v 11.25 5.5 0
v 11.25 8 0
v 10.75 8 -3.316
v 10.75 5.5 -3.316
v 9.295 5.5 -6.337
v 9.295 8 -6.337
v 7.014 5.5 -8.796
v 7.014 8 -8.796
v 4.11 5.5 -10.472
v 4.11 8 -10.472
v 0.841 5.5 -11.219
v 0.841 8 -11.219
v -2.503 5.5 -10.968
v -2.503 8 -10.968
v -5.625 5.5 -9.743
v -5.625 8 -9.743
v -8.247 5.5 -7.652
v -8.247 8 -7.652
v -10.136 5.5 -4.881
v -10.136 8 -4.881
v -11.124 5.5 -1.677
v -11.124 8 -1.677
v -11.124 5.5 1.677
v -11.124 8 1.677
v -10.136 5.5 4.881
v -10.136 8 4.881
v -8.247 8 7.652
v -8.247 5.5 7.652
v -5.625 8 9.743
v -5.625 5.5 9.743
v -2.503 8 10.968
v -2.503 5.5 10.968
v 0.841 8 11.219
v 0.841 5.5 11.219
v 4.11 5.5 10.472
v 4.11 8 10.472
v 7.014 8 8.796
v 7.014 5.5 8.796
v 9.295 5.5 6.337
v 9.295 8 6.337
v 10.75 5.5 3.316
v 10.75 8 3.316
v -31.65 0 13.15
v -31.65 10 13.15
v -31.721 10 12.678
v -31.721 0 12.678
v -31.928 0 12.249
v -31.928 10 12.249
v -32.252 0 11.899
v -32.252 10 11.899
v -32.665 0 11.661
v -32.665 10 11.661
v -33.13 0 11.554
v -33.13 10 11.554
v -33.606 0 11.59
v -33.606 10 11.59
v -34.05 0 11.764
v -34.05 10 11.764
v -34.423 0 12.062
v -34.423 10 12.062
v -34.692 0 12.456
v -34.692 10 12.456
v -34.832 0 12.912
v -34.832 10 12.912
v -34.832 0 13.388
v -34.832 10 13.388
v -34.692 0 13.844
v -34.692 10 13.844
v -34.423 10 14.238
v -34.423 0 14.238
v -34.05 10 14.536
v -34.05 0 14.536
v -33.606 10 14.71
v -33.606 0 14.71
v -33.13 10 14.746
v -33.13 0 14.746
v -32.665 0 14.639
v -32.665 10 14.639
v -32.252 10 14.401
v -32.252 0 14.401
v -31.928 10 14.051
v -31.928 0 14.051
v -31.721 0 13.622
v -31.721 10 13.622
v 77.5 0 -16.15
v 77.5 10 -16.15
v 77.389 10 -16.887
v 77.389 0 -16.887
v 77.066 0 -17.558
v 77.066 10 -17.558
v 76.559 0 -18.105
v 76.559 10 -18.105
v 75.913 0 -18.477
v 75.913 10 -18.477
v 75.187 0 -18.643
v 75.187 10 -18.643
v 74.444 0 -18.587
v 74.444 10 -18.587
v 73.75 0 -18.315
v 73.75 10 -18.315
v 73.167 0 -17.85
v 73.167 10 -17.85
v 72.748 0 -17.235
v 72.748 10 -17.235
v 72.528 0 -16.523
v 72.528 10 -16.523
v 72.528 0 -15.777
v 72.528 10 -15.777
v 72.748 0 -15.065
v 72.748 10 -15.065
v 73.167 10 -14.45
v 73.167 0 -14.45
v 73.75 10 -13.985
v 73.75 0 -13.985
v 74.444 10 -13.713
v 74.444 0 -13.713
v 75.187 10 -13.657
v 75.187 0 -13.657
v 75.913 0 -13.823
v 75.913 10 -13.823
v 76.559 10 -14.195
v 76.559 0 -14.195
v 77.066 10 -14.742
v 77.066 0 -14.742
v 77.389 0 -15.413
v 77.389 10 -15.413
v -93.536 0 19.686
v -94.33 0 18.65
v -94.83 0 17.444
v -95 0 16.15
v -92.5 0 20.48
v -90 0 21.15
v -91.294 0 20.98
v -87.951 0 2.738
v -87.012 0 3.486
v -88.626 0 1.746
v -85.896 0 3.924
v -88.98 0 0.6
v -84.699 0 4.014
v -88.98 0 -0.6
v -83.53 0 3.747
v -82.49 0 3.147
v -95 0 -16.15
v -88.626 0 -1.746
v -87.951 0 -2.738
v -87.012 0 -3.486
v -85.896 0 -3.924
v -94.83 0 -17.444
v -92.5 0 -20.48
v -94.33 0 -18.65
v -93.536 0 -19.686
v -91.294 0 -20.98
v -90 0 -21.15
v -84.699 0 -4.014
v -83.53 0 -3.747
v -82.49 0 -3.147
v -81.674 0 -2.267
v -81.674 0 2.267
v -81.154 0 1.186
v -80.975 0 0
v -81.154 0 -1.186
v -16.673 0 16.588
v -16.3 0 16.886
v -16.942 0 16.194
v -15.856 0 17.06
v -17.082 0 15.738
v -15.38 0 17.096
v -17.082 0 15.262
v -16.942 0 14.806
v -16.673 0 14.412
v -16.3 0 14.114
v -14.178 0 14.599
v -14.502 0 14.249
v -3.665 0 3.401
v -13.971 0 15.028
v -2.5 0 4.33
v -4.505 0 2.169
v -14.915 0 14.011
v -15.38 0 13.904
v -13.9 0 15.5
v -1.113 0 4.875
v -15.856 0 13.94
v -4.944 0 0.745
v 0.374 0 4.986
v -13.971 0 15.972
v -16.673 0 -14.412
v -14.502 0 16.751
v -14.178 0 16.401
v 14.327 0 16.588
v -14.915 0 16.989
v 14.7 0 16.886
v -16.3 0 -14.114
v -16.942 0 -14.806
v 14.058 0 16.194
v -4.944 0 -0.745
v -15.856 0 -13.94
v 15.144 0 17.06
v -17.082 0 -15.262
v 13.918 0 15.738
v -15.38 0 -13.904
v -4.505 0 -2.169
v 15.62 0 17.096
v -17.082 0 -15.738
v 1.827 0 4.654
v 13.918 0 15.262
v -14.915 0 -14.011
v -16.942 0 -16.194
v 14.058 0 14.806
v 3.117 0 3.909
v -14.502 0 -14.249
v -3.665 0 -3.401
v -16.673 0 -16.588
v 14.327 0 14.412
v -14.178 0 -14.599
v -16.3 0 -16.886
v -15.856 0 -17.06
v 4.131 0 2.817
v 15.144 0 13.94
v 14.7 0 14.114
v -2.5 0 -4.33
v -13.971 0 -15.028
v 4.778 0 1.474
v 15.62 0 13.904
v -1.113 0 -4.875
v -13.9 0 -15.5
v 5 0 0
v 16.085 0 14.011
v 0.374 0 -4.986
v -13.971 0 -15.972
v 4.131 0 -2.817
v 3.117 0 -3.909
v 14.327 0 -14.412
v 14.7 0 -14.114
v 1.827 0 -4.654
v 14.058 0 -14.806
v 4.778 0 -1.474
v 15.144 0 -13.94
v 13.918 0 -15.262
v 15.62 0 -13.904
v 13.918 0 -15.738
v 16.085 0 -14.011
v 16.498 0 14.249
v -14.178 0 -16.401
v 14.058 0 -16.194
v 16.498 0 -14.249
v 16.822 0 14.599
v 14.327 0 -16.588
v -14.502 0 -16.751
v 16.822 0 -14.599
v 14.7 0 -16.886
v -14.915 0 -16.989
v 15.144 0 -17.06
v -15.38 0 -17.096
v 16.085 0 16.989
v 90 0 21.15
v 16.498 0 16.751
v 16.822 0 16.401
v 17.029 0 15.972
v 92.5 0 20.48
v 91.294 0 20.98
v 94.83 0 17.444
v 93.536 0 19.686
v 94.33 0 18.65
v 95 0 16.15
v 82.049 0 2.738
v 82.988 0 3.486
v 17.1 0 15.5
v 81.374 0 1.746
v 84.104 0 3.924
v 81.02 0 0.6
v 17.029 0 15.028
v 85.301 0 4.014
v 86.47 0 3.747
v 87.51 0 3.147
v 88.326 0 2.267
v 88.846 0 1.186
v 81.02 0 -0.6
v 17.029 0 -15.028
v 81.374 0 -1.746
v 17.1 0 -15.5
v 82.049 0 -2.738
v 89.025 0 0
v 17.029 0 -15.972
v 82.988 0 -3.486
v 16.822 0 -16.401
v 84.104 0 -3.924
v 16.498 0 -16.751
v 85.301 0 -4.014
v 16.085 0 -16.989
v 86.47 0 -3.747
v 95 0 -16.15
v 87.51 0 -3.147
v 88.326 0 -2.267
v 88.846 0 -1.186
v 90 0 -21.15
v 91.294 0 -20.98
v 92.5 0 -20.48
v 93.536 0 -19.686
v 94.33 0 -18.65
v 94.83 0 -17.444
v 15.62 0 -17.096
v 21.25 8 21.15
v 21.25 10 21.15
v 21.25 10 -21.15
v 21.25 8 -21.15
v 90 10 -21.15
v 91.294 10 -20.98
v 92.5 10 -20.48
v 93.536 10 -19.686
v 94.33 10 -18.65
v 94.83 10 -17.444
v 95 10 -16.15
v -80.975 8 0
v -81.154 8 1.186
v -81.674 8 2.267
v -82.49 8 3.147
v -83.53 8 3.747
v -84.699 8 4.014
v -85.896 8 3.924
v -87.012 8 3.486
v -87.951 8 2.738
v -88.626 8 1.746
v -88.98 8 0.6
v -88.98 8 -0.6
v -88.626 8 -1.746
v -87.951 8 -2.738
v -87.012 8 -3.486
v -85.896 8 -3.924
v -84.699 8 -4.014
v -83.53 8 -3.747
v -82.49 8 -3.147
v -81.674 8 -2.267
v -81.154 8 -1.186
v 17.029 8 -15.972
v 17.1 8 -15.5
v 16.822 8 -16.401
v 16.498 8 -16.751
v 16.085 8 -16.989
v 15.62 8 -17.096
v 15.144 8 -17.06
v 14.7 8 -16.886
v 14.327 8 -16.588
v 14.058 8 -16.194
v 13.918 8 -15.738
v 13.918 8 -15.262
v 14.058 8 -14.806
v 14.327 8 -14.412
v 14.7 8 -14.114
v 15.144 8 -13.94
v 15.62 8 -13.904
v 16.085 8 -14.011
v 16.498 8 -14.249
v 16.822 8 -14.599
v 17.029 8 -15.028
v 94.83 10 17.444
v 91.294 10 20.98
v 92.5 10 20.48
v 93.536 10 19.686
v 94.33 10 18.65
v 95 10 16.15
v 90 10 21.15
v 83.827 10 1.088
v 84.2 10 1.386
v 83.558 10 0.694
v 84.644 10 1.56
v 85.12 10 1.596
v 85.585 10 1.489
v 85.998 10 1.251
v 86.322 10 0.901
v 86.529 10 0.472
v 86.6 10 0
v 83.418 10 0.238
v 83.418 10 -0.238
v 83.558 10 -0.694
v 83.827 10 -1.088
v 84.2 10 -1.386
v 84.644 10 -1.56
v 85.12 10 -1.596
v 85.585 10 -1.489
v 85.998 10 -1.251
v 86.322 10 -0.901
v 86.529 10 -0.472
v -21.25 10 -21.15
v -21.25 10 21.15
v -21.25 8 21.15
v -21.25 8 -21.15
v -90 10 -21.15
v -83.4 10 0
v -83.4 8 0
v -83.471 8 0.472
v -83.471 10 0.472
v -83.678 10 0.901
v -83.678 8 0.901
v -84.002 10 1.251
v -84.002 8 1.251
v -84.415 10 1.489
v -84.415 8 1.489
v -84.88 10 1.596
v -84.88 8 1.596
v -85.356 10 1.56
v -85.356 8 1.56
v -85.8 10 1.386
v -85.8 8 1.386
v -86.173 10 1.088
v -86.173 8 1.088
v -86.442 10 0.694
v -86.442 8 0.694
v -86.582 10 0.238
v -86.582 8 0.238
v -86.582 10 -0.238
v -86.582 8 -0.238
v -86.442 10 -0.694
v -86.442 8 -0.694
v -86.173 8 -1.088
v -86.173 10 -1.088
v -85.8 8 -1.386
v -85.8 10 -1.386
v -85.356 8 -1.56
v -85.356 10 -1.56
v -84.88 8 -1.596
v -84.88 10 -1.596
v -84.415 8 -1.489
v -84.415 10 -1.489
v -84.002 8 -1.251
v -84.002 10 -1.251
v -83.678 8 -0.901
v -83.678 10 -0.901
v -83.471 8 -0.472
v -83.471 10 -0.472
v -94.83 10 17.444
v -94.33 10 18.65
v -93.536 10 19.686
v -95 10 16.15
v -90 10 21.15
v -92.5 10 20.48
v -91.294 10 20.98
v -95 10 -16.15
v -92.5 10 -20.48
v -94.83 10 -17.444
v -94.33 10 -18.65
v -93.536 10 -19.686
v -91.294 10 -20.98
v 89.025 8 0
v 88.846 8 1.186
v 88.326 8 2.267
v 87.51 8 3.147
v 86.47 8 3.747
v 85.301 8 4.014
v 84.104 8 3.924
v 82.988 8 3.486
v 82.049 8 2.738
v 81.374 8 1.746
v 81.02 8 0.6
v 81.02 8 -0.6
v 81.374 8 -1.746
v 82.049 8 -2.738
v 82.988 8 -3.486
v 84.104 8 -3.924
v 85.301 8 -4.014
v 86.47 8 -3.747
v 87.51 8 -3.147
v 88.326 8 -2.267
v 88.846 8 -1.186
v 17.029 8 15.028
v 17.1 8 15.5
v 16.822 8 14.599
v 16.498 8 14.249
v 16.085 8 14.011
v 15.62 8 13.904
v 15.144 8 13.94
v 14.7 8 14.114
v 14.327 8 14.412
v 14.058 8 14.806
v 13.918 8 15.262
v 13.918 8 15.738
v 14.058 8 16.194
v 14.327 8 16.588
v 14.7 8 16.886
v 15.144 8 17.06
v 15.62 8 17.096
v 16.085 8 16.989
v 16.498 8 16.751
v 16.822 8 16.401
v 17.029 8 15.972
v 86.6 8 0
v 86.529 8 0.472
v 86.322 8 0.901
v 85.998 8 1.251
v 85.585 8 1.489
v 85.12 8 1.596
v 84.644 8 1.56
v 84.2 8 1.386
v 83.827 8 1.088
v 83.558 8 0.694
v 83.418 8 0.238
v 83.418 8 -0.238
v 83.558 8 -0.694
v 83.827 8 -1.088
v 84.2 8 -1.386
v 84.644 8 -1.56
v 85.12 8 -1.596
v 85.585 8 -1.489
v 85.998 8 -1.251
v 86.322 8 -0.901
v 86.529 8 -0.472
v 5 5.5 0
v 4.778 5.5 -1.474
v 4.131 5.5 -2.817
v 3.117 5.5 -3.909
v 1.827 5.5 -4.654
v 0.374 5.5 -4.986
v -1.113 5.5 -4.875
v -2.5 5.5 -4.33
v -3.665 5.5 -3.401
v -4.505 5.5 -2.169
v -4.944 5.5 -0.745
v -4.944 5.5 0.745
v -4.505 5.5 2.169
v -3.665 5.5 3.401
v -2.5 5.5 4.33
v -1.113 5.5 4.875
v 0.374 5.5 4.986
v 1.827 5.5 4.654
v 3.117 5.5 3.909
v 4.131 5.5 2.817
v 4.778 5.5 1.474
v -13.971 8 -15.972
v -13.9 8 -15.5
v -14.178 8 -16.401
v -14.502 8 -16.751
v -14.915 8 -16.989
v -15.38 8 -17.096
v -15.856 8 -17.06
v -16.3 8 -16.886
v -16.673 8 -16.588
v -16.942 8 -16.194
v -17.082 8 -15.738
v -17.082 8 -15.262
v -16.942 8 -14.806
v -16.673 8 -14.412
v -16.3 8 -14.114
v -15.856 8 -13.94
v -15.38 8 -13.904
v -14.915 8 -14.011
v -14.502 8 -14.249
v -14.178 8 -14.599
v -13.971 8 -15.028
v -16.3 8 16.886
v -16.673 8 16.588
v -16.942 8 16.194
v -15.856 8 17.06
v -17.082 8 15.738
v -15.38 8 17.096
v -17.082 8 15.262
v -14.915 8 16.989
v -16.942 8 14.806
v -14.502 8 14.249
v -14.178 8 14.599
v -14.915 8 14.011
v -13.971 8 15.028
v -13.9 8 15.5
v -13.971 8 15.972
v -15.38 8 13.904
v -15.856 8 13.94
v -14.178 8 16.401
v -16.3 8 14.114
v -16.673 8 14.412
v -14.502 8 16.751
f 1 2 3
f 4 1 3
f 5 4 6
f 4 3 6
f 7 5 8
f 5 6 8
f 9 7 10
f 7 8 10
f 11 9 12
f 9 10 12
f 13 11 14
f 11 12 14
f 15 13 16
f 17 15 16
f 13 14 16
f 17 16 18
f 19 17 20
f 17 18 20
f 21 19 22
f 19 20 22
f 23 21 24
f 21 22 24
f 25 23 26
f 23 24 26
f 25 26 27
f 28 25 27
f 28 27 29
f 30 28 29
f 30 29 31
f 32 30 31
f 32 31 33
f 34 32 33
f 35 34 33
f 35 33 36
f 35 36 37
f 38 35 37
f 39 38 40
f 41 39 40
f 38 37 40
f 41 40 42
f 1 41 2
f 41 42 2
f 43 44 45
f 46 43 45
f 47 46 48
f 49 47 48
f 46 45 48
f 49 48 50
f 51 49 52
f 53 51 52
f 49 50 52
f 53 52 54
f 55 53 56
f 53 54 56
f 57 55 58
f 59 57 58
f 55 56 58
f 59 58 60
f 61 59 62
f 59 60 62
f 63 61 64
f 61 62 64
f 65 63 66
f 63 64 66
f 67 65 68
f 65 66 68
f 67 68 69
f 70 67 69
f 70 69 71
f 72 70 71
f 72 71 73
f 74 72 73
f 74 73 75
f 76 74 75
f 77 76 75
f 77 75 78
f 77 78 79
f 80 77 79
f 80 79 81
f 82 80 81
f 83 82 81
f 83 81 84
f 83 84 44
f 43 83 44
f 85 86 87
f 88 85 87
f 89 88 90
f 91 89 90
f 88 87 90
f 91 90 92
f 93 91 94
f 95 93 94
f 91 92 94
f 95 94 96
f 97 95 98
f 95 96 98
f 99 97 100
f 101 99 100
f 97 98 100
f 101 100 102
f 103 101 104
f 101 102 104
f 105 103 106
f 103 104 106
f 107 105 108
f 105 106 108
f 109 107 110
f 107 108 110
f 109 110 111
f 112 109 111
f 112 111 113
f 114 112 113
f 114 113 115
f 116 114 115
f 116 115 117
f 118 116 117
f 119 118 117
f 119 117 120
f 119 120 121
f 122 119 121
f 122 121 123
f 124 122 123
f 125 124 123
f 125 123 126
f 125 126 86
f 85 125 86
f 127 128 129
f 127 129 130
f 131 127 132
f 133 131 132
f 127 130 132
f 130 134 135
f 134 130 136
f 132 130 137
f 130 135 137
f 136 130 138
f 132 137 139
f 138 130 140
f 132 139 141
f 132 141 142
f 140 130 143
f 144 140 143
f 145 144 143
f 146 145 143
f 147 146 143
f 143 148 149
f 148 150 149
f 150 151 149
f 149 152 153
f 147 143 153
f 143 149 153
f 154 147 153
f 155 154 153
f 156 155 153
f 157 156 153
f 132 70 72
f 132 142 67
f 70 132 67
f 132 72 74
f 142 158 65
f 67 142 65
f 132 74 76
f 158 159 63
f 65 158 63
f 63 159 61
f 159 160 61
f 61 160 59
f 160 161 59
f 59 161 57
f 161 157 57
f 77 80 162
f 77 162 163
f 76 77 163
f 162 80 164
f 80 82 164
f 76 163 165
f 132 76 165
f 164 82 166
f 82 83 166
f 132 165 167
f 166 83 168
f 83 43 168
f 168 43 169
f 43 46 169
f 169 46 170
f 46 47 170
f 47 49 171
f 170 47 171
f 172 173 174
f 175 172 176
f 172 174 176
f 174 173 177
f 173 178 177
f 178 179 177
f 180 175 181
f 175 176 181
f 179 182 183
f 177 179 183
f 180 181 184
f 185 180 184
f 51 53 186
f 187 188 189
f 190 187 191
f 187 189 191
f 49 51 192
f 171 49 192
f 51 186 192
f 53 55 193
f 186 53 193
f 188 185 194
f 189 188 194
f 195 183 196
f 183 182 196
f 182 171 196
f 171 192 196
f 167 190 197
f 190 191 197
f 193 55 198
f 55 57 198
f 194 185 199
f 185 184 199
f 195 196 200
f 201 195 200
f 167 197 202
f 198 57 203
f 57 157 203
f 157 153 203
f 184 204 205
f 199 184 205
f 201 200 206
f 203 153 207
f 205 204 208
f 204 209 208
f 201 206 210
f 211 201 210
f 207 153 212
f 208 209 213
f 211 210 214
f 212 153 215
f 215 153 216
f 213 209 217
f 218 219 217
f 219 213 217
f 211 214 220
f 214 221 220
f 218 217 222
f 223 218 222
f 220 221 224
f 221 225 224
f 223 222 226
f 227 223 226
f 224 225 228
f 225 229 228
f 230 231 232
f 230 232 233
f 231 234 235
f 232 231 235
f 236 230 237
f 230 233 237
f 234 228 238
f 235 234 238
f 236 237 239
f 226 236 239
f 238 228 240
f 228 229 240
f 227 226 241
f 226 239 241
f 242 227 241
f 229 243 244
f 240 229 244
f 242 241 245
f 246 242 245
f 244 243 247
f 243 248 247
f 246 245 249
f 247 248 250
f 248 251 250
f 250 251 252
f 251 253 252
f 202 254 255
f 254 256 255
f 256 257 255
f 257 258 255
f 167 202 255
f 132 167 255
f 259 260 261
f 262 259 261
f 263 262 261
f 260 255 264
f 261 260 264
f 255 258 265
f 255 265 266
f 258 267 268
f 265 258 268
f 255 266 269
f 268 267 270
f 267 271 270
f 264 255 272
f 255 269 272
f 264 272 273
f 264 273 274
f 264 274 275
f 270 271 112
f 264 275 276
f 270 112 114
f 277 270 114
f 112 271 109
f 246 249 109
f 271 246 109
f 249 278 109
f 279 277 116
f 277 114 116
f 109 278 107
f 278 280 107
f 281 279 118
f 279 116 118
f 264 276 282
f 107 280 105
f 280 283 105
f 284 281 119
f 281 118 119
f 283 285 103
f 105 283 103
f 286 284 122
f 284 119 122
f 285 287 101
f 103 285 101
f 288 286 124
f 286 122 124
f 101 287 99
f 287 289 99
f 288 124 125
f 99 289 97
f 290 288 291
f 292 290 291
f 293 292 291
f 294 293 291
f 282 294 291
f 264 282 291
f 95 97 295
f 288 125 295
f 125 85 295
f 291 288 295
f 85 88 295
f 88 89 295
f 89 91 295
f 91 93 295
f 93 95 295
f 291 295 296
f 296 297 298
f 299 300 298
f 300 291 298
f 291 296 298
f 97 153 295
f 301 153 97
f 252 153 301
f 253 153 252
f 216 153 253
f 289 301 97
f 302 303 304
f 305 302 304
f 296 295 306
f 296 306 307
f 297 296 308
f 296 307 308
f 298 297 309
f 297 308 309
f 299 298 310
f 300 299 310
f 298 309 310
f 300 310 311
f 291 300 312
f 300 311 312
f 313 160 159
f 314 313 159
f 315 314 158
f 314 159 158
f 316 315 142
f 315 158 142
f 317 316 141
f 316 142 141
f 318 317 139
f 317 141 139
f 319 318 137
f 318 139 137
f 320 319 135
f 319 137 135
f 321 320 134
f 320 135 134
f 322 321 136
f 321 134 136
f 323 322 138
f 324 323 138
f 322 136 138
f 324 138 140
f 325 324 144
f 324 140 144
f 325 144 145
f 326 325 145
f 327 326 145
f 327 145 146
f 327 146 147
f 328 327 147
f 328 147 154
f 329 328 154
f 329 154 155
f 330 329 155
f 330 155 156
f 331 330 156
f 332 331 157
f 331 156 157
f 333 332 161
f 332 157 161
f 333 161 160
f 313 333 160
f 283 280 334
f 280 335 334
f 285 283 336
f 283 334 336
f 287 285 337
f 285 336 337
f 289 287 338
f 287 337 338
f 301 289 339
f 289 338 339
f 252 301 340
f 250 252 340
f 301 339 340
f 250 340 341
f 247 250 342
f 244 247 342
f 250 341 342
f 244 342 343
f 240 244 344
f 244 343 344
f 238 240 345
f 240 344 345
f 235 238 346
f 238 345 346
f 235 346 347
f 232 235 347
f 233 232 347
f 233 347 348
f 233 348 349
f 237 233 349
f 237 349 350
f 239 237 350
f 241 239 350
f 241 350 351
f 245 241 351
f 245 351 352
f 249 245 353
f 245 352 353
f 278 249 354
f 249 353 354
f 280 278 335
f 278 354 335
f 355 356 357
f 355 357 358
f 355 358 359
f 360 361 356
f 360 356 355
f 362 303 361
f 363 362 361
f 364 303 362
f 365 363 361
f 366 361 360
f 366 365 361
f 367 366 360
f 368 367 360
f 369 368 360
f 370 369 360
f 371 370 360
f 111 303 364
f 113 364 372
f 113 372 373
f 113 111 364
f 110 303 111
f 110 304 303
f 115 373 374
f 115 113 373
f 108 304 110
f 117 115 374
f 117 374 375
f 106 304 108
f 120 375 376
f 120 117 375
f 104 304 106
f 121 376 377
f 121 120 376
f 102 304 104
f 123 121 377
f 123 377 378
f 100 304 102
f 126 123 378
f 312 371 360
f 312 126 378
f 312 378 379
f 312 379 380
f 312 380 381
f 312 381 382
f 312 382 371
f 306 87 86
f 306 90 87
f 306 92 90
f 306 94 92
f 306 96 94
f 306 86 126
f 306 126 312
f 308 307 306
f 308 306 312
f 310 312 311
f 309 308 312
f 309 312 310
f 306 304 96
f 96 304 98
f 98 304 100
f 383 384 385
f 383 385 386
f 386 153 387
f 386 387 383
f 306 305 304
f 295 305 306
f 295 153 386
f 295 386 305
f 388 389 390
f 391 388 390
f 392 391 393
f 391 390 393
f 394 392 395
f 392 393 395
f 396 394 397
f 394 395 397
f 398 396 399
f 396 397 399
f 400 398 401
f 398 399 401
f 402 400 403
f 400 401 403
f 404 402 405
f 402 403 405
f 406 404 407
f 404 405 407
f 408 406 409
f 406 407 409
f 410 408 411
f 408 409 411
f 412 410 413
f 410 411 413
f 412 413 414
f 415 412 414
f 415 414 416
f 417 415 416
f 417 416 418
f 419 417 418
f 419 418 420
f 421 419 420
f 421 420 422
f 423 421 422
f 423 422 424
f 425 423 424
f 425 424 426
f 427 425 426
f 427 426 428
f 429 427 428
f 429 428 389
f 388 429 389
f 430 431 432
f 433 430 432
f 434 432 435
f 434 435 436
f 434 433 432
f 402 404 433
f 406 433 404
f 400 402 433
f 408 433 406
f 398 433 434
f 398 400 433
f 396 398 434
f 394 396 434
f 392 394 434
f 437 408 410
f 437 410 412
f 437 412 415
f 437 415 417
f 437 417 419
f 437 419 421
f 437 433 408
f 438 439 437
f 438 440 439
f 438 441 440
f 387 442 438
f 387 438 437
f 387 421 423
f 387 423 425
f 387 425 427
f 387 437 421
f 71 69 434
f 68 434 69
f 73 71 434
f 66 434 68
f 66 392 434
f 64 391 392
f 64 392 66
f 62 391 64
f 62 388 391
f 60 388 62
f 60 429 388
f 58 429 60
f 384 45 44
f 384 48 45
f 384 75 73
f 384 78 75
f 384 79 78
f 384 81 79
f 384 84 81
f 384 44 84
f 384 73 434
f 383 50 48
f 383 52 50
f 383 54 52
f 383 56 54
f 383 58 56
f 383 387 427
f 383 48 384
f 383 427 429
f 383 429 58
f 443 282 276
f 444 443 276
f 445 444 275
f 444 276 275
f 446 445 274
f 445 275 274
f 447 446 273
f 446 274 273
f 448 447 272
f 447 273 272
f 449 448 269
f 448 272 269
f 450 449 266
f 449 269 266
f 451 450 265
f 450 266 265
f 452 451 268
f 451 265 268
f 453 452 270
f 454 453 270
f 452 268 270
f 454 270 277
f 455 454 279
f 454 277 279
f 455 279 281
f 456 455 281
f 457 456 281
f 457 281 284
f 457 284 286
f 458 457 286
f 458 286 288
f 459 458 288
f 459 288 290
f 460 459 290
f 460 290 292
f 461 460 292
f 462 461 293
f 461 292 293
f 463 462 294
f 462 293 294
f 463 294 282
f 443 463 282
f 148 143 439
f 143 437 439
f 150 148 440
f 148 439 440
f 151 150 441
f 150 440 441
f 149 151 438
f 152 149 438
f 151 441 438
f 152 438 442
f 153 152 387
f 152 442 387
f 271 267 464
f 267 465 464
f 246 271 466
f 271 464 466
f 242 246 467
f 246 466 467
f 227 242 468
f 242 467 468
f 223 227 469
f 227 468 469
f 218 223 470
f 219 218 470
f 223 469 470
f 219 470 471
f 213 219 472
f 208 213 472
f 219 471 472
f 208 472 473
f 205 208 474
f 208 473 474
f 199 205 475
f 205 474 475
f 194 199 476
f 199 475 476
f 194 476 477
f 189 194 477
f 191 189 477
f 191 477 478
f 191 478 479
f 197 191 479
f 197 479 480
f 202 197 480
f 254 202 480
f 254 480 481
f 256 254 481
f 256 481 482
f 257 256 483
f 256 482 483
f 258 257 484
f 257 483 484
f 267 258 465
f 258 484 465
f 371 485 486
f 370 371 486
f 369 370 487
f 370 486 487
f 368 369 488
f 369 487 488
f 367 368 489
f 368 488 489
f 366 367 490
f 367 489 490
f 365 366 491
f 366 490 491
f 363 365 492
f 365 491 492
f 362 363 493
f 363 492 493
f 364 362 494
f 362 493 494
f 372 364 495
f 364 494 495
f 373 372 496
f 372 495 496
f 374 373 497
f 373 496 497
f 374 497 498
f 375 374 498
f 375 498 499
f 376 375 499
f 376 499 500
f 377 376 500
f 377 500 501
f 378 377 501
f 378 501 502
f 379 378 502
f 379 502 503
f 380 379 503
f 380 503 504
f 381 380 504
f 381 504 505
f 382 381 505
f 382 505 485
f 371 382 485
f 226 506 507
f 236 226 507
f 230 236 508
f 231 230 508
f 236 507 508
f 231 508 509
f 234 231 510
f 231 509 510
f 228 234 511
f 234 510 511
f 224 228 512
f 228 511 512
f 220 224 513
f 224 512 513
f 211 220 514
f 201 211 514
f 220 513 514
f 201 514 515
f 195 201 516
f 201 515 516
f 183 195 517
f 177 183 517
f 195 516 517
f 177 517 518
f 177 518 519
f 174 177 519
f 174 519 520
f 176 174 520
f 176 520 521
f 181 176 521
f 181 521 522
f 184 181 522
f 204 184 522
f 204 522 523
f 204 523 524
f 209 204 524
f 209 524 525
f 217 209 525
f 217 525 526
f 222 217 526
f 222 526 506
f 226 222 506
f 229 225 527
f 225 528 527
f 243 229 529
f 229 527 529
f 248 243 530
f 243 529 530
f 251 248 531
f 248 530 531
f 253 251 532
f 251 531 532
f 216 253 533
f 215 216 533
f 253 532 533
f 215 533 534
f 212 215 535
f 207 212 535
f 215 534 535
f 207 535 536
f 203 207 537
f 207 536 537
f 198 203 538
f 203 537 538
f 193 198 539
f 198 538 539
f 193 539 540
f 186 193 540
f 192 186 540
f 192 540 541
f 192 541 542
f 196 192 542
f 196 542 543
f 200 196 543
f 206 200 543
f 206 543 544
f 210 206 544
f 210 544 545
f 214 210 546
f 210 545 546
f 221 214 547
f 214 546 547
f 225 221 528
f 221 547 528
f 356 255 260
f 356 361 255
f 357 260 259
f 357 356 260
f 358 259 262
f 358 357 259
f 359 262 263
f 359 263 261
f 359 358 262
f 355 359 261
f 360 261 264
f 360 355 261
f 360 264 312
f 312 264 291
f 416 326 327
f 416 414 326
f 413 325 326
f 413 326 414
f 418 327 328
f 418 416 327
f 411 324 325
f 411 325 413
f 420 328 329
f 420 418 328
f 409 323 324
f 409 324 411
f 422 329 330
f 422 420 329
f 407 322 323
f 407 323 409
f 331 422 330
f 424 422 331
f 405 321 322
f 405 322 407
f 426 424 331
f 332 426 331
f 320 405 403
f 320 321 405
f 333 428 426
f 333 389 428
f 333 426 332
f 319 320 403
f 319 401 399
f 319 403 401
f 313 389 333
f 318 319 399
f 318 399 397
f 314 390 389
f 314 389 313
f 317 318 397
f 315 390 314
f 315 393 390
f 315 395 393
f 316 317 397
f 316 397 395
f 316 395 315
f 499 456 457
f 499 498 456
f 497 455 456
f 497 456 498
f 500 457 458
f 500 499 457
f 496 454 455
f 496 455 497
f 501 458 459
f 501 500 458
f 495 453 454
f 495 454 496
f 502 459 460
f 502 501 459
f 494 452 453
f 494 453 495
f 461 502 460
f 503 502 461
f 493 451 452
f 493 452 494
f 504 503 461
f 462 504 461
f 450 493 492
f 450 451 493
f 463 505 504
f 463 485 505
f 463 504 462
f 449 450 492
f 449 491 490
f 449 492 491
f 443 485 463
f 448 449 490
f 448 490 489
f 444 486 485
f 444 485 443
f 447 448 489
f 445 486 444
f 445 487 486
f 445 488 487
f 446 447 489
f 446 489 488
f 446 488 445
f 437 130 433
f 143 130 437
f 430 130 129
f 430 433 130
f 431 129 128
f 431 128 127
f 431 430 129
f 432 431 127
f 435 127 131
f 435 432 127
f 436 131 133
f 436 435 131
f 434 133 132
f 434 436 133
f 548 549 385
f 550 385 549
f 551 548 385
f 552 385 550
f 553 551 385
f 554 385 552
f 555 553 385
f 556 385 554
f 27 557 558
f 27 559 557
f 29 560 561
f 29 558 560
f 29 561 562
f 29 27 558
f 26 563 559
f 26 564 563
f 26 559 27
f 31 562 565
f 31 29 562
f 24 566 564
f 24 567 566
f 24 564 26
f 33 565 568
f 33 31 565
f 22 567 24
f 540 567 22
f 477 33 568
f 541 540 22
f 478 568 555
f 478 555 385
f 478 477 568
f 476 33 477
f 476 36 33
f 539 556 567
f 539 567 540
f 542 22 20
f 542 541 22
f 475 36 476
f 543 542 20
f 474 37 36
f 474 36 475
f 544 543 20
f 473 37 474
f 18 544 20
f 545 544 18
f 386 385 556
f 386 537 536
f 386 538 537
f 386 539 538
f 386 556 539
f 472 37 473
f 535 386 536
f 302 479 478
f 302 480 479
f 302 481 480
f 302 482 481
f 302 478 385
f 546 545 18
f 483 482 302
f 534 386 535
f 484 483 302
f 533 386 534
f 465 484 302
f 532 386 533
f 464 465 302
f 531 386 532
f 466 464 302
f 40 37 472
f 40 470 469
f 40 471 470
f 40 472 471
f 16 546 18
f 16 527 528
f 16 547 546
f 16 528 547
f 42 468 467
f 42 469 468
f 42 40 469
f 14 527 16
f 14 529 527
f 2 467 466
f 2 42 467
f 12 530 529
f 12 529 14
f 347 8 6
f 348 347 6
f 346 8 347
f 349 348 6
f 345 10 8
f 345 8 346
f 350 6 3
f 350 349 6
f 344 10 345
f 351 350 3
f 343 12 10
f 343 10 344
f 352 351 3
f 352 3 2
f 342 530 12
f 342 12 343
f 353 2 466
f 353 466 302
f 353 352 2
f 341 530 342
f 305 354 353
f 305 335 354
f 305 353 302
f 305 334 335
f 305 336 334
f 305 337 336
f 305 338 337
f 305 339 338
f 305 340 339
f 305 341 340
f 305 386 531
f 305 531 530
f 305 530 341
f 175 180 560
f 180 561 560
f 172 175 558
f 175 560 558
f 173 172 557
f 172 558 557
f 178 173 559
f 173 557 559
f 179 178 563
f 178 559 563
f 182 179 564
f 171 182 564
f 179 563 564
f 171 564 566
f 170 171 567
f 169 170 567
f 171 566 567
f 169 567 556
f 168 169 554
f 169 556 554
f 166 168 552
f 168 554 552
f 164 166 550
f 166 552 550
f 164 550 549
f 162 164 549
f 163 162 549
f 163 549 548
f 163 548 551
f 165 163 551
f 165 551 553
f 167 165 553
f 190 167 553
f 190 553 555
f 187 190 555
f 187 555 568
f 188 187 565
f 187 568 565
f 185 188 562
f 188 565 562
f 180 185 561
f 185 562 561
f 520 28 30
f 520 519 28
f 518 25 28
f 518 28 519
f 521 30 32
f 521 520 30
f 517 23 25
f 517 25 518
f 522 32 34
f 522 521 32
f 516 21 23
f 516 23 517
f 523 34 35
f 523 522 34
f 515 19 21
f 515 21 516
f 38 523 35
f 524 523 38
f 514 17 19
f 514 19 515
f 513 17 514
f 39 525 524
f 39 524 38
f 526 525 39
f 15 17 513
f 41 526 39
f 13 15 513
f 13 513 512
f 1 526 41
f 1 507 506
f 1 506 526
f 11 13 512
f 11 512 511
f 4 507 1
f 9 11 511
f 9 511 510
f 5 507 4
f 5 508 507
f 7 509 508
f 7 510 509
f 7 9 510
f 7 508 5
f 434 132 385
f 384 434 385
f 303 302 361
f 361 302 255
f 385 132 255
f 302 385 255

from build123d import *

# Parameters (mm, degrees)
SKETCH_1_W          = 190
SKETCH_1_H          = 42.3
EXTRUDE_1_DEPTH     = 10
SKETCH_2_W          = 42.5
SKETCH_2_H          = 49.677136544
CUT_EXTRUDE_1_DEPTH = 2
SKETCH_3_R          = 1.6
SKETCH_3_R_2        = 11.25
CUT_EXTRUDE_2_DEPTH = 2.5
SKETCH_4_R          = 5
CUT_EXTRUDE_3_DEPTH = 6.5
SKETCH_5_R          = 4.025
CUT_EXTRUDE_4_DEPTH = 8
SKETCH_6_R          = 1.6
CUT_EXTRUDE_5_DEPTH = 3
SKETCH_7_R          = 1.6
CUT_EXTRUDE_6_DEPTH = 3
FILLET_1_R          = 5
SKETCH_8_R          = 1.6
CUT_EXTRUDE_7_DEPTH = 9
CUT_EXTRUDE_8_REACH = 12
SKETCH_9_R          = 1.6
SKETCH_11_R         = 2.5
CUT_EXTRUDE_9_DEPTH = 11


with BuildPart() as part:
    # 草图1 → 凸台-拉伸1 (new body)
    with BuildSketch(Plane(origin=(0, 0, 0), x_dir=(1, 0, 0), z_dir=(0, 1, 0))):
        Rectangle(SKETCH_1_W, SKETCH_1_H)
    extrude(amount=EXTRUDE_1_DEPTH)

    # 草图2 → 切除-拉伸1 (cut)
    with BuildSketch(Plane(origin=(0, 10, 0), x_dir=(1, 0, 0), z_dir=(0, 1, 0))):
        Rectangle(SKETCH_2_W, SKETCH_2_H)
    extrude(amount=-CUT_EXTRUDE_1_DEPTH, mode=Mode.SUBTRACT)

    # 草图3 → 切除-拉伸2 (cut)
    with BuildSketch(Plane(origin=(0, 8, 0), x_dir=(1, 0, 0), z_dir=(0, 1, 0))):
        with Locations((-15.5, 15.5)):
            Circle(SKETCH_3_R)
        with Locations((15.5, 15.5)):
            Circle(SKETCH_3_R)
        with Locations((15.5, -15.5)):
            Circle(SKETCH_3_R)
        with Locations((-15.5, -15.5)):
            Circle(SKETCH_3_R)
        Circle(SKETCH_3_R_2)
    extrude(amount=-CUT_EXTRUDE_2_DEPTH, mode=Mode.SUBTRACT)

    # 草图4 → 切除-拉伸3 (cut, through all)
    with BuildSketch(Plane(origin=(0, 5.5, 0), x_dir=(1, 0, 0), z_dir=(0, 1, 0))):
        Circle(SKETCH_4_R)
    extrude(amount=-CUT_EXTRUDE_3_DEPTH, mode=Mode.SUBTRACT)

    # 草图5 → 切除-拉伸4 (cut)
    with BuildSketch(Plane.XZ):
        with Locations((-85, 0)):
            Circle(SKETCH_5_R)
        with Locations((85, 0)):
            Circle(SKETCH_5_R)
    extrude(amount=-CUT_EXTRUDE_4_DEPTH, mode=Mode.SUBTRACT)

    # 草图6 → 切除-拉伸5 (cut, through all)
    with BuildSketch(Plane.XZ.offset(-8)):
        with Locations((-85, 0)):
            Circle(SKETCH_6_R)
    extrude(amount=-CUT_EXTRUDE_5_DEPTH, mode=Mode.SUBTRACT)

    # 草图7 → 切除-拉伸6 (cut, through all)
    with BuildSketch(Plane.XZ.offset(-8)):
        with Locations((85, 0)):
            Circle(SKETCH_7_R)
    extrude(amount=-CUT_EXTRUDE_6_DEPTH, mode=Mode.SUBTRACT)

    # 圆角1
    fillet_1_edges = [part.edges().sort_by_distance(p)[0] for p in [
        (95, 5, 21.15),
        (-95, 5, 21.15),
        (-95, 5, -21.15),
        (95, 5, -21.15),
    ]]
    fillet(fillet_1_edges, radius=FILLET_1_R)

    # 草图8 → 切除-拉伸7 (cut, through all)
    with BuildSketch(Plane(origin=(0, 8, 0), x_dir=(1, 0, 0), z_dir=(0, 1, 0))):
        with Locations((15.5, 15.5)):
            Circle(SKETCH_8_R)
        with Locations((15.5, -15.5)):
            Circle(SKETCH_8_R)
        with Locations((-15.5, -15.5)):
            Circle(SKETCH_8_R)
        with Locations((-15.5, 15.5)):
            Circle(SKETCH_8_R)
    extrude(amount=-CUT_EXTRUDE_7_DEPTH, mode=Mode.SUBTRACT)

    # 草图9 → 切除-拉伸8 (cut, up to next)
    with BuildSketch(Plane(origin=(0, 10, 0), x_dir=(1, 0, 0), z_dir=(0, 1, 0)), mode=Mode.PRIVATE) as cut_extrude_8_sk1:
        with Locations((-33.25, -13.15)):
            Circle(SKETCH_9_R)
    cut_extrude_8_tool1 = extrude(cut_extrude_8_sk1.sketch, amount=-CUT_EXTRUDE_8_REACH, mode=Mode.PRIVATE) & part.part
    add(cut_extrude_8_tool1.solids().sort_by_distance((-33.25, 10, 13.15))[0], mode=Mode.SUBTRACT)

    # 草图11 → 切除-拉伸9 (cut, through all)
    with BuildSketch(Plane(origin=(0, 10, 0), x_dir=(1, 0, 0), z_dir=(0, 1, 0))):
        with Locations((75, 16.15)):
            Circle(SKETCH_11_R)
    extrude(amount=-CUT_EXTRUDE_9_DEPTH, mode=Mode.SUBTRACT)


solid = part.part
